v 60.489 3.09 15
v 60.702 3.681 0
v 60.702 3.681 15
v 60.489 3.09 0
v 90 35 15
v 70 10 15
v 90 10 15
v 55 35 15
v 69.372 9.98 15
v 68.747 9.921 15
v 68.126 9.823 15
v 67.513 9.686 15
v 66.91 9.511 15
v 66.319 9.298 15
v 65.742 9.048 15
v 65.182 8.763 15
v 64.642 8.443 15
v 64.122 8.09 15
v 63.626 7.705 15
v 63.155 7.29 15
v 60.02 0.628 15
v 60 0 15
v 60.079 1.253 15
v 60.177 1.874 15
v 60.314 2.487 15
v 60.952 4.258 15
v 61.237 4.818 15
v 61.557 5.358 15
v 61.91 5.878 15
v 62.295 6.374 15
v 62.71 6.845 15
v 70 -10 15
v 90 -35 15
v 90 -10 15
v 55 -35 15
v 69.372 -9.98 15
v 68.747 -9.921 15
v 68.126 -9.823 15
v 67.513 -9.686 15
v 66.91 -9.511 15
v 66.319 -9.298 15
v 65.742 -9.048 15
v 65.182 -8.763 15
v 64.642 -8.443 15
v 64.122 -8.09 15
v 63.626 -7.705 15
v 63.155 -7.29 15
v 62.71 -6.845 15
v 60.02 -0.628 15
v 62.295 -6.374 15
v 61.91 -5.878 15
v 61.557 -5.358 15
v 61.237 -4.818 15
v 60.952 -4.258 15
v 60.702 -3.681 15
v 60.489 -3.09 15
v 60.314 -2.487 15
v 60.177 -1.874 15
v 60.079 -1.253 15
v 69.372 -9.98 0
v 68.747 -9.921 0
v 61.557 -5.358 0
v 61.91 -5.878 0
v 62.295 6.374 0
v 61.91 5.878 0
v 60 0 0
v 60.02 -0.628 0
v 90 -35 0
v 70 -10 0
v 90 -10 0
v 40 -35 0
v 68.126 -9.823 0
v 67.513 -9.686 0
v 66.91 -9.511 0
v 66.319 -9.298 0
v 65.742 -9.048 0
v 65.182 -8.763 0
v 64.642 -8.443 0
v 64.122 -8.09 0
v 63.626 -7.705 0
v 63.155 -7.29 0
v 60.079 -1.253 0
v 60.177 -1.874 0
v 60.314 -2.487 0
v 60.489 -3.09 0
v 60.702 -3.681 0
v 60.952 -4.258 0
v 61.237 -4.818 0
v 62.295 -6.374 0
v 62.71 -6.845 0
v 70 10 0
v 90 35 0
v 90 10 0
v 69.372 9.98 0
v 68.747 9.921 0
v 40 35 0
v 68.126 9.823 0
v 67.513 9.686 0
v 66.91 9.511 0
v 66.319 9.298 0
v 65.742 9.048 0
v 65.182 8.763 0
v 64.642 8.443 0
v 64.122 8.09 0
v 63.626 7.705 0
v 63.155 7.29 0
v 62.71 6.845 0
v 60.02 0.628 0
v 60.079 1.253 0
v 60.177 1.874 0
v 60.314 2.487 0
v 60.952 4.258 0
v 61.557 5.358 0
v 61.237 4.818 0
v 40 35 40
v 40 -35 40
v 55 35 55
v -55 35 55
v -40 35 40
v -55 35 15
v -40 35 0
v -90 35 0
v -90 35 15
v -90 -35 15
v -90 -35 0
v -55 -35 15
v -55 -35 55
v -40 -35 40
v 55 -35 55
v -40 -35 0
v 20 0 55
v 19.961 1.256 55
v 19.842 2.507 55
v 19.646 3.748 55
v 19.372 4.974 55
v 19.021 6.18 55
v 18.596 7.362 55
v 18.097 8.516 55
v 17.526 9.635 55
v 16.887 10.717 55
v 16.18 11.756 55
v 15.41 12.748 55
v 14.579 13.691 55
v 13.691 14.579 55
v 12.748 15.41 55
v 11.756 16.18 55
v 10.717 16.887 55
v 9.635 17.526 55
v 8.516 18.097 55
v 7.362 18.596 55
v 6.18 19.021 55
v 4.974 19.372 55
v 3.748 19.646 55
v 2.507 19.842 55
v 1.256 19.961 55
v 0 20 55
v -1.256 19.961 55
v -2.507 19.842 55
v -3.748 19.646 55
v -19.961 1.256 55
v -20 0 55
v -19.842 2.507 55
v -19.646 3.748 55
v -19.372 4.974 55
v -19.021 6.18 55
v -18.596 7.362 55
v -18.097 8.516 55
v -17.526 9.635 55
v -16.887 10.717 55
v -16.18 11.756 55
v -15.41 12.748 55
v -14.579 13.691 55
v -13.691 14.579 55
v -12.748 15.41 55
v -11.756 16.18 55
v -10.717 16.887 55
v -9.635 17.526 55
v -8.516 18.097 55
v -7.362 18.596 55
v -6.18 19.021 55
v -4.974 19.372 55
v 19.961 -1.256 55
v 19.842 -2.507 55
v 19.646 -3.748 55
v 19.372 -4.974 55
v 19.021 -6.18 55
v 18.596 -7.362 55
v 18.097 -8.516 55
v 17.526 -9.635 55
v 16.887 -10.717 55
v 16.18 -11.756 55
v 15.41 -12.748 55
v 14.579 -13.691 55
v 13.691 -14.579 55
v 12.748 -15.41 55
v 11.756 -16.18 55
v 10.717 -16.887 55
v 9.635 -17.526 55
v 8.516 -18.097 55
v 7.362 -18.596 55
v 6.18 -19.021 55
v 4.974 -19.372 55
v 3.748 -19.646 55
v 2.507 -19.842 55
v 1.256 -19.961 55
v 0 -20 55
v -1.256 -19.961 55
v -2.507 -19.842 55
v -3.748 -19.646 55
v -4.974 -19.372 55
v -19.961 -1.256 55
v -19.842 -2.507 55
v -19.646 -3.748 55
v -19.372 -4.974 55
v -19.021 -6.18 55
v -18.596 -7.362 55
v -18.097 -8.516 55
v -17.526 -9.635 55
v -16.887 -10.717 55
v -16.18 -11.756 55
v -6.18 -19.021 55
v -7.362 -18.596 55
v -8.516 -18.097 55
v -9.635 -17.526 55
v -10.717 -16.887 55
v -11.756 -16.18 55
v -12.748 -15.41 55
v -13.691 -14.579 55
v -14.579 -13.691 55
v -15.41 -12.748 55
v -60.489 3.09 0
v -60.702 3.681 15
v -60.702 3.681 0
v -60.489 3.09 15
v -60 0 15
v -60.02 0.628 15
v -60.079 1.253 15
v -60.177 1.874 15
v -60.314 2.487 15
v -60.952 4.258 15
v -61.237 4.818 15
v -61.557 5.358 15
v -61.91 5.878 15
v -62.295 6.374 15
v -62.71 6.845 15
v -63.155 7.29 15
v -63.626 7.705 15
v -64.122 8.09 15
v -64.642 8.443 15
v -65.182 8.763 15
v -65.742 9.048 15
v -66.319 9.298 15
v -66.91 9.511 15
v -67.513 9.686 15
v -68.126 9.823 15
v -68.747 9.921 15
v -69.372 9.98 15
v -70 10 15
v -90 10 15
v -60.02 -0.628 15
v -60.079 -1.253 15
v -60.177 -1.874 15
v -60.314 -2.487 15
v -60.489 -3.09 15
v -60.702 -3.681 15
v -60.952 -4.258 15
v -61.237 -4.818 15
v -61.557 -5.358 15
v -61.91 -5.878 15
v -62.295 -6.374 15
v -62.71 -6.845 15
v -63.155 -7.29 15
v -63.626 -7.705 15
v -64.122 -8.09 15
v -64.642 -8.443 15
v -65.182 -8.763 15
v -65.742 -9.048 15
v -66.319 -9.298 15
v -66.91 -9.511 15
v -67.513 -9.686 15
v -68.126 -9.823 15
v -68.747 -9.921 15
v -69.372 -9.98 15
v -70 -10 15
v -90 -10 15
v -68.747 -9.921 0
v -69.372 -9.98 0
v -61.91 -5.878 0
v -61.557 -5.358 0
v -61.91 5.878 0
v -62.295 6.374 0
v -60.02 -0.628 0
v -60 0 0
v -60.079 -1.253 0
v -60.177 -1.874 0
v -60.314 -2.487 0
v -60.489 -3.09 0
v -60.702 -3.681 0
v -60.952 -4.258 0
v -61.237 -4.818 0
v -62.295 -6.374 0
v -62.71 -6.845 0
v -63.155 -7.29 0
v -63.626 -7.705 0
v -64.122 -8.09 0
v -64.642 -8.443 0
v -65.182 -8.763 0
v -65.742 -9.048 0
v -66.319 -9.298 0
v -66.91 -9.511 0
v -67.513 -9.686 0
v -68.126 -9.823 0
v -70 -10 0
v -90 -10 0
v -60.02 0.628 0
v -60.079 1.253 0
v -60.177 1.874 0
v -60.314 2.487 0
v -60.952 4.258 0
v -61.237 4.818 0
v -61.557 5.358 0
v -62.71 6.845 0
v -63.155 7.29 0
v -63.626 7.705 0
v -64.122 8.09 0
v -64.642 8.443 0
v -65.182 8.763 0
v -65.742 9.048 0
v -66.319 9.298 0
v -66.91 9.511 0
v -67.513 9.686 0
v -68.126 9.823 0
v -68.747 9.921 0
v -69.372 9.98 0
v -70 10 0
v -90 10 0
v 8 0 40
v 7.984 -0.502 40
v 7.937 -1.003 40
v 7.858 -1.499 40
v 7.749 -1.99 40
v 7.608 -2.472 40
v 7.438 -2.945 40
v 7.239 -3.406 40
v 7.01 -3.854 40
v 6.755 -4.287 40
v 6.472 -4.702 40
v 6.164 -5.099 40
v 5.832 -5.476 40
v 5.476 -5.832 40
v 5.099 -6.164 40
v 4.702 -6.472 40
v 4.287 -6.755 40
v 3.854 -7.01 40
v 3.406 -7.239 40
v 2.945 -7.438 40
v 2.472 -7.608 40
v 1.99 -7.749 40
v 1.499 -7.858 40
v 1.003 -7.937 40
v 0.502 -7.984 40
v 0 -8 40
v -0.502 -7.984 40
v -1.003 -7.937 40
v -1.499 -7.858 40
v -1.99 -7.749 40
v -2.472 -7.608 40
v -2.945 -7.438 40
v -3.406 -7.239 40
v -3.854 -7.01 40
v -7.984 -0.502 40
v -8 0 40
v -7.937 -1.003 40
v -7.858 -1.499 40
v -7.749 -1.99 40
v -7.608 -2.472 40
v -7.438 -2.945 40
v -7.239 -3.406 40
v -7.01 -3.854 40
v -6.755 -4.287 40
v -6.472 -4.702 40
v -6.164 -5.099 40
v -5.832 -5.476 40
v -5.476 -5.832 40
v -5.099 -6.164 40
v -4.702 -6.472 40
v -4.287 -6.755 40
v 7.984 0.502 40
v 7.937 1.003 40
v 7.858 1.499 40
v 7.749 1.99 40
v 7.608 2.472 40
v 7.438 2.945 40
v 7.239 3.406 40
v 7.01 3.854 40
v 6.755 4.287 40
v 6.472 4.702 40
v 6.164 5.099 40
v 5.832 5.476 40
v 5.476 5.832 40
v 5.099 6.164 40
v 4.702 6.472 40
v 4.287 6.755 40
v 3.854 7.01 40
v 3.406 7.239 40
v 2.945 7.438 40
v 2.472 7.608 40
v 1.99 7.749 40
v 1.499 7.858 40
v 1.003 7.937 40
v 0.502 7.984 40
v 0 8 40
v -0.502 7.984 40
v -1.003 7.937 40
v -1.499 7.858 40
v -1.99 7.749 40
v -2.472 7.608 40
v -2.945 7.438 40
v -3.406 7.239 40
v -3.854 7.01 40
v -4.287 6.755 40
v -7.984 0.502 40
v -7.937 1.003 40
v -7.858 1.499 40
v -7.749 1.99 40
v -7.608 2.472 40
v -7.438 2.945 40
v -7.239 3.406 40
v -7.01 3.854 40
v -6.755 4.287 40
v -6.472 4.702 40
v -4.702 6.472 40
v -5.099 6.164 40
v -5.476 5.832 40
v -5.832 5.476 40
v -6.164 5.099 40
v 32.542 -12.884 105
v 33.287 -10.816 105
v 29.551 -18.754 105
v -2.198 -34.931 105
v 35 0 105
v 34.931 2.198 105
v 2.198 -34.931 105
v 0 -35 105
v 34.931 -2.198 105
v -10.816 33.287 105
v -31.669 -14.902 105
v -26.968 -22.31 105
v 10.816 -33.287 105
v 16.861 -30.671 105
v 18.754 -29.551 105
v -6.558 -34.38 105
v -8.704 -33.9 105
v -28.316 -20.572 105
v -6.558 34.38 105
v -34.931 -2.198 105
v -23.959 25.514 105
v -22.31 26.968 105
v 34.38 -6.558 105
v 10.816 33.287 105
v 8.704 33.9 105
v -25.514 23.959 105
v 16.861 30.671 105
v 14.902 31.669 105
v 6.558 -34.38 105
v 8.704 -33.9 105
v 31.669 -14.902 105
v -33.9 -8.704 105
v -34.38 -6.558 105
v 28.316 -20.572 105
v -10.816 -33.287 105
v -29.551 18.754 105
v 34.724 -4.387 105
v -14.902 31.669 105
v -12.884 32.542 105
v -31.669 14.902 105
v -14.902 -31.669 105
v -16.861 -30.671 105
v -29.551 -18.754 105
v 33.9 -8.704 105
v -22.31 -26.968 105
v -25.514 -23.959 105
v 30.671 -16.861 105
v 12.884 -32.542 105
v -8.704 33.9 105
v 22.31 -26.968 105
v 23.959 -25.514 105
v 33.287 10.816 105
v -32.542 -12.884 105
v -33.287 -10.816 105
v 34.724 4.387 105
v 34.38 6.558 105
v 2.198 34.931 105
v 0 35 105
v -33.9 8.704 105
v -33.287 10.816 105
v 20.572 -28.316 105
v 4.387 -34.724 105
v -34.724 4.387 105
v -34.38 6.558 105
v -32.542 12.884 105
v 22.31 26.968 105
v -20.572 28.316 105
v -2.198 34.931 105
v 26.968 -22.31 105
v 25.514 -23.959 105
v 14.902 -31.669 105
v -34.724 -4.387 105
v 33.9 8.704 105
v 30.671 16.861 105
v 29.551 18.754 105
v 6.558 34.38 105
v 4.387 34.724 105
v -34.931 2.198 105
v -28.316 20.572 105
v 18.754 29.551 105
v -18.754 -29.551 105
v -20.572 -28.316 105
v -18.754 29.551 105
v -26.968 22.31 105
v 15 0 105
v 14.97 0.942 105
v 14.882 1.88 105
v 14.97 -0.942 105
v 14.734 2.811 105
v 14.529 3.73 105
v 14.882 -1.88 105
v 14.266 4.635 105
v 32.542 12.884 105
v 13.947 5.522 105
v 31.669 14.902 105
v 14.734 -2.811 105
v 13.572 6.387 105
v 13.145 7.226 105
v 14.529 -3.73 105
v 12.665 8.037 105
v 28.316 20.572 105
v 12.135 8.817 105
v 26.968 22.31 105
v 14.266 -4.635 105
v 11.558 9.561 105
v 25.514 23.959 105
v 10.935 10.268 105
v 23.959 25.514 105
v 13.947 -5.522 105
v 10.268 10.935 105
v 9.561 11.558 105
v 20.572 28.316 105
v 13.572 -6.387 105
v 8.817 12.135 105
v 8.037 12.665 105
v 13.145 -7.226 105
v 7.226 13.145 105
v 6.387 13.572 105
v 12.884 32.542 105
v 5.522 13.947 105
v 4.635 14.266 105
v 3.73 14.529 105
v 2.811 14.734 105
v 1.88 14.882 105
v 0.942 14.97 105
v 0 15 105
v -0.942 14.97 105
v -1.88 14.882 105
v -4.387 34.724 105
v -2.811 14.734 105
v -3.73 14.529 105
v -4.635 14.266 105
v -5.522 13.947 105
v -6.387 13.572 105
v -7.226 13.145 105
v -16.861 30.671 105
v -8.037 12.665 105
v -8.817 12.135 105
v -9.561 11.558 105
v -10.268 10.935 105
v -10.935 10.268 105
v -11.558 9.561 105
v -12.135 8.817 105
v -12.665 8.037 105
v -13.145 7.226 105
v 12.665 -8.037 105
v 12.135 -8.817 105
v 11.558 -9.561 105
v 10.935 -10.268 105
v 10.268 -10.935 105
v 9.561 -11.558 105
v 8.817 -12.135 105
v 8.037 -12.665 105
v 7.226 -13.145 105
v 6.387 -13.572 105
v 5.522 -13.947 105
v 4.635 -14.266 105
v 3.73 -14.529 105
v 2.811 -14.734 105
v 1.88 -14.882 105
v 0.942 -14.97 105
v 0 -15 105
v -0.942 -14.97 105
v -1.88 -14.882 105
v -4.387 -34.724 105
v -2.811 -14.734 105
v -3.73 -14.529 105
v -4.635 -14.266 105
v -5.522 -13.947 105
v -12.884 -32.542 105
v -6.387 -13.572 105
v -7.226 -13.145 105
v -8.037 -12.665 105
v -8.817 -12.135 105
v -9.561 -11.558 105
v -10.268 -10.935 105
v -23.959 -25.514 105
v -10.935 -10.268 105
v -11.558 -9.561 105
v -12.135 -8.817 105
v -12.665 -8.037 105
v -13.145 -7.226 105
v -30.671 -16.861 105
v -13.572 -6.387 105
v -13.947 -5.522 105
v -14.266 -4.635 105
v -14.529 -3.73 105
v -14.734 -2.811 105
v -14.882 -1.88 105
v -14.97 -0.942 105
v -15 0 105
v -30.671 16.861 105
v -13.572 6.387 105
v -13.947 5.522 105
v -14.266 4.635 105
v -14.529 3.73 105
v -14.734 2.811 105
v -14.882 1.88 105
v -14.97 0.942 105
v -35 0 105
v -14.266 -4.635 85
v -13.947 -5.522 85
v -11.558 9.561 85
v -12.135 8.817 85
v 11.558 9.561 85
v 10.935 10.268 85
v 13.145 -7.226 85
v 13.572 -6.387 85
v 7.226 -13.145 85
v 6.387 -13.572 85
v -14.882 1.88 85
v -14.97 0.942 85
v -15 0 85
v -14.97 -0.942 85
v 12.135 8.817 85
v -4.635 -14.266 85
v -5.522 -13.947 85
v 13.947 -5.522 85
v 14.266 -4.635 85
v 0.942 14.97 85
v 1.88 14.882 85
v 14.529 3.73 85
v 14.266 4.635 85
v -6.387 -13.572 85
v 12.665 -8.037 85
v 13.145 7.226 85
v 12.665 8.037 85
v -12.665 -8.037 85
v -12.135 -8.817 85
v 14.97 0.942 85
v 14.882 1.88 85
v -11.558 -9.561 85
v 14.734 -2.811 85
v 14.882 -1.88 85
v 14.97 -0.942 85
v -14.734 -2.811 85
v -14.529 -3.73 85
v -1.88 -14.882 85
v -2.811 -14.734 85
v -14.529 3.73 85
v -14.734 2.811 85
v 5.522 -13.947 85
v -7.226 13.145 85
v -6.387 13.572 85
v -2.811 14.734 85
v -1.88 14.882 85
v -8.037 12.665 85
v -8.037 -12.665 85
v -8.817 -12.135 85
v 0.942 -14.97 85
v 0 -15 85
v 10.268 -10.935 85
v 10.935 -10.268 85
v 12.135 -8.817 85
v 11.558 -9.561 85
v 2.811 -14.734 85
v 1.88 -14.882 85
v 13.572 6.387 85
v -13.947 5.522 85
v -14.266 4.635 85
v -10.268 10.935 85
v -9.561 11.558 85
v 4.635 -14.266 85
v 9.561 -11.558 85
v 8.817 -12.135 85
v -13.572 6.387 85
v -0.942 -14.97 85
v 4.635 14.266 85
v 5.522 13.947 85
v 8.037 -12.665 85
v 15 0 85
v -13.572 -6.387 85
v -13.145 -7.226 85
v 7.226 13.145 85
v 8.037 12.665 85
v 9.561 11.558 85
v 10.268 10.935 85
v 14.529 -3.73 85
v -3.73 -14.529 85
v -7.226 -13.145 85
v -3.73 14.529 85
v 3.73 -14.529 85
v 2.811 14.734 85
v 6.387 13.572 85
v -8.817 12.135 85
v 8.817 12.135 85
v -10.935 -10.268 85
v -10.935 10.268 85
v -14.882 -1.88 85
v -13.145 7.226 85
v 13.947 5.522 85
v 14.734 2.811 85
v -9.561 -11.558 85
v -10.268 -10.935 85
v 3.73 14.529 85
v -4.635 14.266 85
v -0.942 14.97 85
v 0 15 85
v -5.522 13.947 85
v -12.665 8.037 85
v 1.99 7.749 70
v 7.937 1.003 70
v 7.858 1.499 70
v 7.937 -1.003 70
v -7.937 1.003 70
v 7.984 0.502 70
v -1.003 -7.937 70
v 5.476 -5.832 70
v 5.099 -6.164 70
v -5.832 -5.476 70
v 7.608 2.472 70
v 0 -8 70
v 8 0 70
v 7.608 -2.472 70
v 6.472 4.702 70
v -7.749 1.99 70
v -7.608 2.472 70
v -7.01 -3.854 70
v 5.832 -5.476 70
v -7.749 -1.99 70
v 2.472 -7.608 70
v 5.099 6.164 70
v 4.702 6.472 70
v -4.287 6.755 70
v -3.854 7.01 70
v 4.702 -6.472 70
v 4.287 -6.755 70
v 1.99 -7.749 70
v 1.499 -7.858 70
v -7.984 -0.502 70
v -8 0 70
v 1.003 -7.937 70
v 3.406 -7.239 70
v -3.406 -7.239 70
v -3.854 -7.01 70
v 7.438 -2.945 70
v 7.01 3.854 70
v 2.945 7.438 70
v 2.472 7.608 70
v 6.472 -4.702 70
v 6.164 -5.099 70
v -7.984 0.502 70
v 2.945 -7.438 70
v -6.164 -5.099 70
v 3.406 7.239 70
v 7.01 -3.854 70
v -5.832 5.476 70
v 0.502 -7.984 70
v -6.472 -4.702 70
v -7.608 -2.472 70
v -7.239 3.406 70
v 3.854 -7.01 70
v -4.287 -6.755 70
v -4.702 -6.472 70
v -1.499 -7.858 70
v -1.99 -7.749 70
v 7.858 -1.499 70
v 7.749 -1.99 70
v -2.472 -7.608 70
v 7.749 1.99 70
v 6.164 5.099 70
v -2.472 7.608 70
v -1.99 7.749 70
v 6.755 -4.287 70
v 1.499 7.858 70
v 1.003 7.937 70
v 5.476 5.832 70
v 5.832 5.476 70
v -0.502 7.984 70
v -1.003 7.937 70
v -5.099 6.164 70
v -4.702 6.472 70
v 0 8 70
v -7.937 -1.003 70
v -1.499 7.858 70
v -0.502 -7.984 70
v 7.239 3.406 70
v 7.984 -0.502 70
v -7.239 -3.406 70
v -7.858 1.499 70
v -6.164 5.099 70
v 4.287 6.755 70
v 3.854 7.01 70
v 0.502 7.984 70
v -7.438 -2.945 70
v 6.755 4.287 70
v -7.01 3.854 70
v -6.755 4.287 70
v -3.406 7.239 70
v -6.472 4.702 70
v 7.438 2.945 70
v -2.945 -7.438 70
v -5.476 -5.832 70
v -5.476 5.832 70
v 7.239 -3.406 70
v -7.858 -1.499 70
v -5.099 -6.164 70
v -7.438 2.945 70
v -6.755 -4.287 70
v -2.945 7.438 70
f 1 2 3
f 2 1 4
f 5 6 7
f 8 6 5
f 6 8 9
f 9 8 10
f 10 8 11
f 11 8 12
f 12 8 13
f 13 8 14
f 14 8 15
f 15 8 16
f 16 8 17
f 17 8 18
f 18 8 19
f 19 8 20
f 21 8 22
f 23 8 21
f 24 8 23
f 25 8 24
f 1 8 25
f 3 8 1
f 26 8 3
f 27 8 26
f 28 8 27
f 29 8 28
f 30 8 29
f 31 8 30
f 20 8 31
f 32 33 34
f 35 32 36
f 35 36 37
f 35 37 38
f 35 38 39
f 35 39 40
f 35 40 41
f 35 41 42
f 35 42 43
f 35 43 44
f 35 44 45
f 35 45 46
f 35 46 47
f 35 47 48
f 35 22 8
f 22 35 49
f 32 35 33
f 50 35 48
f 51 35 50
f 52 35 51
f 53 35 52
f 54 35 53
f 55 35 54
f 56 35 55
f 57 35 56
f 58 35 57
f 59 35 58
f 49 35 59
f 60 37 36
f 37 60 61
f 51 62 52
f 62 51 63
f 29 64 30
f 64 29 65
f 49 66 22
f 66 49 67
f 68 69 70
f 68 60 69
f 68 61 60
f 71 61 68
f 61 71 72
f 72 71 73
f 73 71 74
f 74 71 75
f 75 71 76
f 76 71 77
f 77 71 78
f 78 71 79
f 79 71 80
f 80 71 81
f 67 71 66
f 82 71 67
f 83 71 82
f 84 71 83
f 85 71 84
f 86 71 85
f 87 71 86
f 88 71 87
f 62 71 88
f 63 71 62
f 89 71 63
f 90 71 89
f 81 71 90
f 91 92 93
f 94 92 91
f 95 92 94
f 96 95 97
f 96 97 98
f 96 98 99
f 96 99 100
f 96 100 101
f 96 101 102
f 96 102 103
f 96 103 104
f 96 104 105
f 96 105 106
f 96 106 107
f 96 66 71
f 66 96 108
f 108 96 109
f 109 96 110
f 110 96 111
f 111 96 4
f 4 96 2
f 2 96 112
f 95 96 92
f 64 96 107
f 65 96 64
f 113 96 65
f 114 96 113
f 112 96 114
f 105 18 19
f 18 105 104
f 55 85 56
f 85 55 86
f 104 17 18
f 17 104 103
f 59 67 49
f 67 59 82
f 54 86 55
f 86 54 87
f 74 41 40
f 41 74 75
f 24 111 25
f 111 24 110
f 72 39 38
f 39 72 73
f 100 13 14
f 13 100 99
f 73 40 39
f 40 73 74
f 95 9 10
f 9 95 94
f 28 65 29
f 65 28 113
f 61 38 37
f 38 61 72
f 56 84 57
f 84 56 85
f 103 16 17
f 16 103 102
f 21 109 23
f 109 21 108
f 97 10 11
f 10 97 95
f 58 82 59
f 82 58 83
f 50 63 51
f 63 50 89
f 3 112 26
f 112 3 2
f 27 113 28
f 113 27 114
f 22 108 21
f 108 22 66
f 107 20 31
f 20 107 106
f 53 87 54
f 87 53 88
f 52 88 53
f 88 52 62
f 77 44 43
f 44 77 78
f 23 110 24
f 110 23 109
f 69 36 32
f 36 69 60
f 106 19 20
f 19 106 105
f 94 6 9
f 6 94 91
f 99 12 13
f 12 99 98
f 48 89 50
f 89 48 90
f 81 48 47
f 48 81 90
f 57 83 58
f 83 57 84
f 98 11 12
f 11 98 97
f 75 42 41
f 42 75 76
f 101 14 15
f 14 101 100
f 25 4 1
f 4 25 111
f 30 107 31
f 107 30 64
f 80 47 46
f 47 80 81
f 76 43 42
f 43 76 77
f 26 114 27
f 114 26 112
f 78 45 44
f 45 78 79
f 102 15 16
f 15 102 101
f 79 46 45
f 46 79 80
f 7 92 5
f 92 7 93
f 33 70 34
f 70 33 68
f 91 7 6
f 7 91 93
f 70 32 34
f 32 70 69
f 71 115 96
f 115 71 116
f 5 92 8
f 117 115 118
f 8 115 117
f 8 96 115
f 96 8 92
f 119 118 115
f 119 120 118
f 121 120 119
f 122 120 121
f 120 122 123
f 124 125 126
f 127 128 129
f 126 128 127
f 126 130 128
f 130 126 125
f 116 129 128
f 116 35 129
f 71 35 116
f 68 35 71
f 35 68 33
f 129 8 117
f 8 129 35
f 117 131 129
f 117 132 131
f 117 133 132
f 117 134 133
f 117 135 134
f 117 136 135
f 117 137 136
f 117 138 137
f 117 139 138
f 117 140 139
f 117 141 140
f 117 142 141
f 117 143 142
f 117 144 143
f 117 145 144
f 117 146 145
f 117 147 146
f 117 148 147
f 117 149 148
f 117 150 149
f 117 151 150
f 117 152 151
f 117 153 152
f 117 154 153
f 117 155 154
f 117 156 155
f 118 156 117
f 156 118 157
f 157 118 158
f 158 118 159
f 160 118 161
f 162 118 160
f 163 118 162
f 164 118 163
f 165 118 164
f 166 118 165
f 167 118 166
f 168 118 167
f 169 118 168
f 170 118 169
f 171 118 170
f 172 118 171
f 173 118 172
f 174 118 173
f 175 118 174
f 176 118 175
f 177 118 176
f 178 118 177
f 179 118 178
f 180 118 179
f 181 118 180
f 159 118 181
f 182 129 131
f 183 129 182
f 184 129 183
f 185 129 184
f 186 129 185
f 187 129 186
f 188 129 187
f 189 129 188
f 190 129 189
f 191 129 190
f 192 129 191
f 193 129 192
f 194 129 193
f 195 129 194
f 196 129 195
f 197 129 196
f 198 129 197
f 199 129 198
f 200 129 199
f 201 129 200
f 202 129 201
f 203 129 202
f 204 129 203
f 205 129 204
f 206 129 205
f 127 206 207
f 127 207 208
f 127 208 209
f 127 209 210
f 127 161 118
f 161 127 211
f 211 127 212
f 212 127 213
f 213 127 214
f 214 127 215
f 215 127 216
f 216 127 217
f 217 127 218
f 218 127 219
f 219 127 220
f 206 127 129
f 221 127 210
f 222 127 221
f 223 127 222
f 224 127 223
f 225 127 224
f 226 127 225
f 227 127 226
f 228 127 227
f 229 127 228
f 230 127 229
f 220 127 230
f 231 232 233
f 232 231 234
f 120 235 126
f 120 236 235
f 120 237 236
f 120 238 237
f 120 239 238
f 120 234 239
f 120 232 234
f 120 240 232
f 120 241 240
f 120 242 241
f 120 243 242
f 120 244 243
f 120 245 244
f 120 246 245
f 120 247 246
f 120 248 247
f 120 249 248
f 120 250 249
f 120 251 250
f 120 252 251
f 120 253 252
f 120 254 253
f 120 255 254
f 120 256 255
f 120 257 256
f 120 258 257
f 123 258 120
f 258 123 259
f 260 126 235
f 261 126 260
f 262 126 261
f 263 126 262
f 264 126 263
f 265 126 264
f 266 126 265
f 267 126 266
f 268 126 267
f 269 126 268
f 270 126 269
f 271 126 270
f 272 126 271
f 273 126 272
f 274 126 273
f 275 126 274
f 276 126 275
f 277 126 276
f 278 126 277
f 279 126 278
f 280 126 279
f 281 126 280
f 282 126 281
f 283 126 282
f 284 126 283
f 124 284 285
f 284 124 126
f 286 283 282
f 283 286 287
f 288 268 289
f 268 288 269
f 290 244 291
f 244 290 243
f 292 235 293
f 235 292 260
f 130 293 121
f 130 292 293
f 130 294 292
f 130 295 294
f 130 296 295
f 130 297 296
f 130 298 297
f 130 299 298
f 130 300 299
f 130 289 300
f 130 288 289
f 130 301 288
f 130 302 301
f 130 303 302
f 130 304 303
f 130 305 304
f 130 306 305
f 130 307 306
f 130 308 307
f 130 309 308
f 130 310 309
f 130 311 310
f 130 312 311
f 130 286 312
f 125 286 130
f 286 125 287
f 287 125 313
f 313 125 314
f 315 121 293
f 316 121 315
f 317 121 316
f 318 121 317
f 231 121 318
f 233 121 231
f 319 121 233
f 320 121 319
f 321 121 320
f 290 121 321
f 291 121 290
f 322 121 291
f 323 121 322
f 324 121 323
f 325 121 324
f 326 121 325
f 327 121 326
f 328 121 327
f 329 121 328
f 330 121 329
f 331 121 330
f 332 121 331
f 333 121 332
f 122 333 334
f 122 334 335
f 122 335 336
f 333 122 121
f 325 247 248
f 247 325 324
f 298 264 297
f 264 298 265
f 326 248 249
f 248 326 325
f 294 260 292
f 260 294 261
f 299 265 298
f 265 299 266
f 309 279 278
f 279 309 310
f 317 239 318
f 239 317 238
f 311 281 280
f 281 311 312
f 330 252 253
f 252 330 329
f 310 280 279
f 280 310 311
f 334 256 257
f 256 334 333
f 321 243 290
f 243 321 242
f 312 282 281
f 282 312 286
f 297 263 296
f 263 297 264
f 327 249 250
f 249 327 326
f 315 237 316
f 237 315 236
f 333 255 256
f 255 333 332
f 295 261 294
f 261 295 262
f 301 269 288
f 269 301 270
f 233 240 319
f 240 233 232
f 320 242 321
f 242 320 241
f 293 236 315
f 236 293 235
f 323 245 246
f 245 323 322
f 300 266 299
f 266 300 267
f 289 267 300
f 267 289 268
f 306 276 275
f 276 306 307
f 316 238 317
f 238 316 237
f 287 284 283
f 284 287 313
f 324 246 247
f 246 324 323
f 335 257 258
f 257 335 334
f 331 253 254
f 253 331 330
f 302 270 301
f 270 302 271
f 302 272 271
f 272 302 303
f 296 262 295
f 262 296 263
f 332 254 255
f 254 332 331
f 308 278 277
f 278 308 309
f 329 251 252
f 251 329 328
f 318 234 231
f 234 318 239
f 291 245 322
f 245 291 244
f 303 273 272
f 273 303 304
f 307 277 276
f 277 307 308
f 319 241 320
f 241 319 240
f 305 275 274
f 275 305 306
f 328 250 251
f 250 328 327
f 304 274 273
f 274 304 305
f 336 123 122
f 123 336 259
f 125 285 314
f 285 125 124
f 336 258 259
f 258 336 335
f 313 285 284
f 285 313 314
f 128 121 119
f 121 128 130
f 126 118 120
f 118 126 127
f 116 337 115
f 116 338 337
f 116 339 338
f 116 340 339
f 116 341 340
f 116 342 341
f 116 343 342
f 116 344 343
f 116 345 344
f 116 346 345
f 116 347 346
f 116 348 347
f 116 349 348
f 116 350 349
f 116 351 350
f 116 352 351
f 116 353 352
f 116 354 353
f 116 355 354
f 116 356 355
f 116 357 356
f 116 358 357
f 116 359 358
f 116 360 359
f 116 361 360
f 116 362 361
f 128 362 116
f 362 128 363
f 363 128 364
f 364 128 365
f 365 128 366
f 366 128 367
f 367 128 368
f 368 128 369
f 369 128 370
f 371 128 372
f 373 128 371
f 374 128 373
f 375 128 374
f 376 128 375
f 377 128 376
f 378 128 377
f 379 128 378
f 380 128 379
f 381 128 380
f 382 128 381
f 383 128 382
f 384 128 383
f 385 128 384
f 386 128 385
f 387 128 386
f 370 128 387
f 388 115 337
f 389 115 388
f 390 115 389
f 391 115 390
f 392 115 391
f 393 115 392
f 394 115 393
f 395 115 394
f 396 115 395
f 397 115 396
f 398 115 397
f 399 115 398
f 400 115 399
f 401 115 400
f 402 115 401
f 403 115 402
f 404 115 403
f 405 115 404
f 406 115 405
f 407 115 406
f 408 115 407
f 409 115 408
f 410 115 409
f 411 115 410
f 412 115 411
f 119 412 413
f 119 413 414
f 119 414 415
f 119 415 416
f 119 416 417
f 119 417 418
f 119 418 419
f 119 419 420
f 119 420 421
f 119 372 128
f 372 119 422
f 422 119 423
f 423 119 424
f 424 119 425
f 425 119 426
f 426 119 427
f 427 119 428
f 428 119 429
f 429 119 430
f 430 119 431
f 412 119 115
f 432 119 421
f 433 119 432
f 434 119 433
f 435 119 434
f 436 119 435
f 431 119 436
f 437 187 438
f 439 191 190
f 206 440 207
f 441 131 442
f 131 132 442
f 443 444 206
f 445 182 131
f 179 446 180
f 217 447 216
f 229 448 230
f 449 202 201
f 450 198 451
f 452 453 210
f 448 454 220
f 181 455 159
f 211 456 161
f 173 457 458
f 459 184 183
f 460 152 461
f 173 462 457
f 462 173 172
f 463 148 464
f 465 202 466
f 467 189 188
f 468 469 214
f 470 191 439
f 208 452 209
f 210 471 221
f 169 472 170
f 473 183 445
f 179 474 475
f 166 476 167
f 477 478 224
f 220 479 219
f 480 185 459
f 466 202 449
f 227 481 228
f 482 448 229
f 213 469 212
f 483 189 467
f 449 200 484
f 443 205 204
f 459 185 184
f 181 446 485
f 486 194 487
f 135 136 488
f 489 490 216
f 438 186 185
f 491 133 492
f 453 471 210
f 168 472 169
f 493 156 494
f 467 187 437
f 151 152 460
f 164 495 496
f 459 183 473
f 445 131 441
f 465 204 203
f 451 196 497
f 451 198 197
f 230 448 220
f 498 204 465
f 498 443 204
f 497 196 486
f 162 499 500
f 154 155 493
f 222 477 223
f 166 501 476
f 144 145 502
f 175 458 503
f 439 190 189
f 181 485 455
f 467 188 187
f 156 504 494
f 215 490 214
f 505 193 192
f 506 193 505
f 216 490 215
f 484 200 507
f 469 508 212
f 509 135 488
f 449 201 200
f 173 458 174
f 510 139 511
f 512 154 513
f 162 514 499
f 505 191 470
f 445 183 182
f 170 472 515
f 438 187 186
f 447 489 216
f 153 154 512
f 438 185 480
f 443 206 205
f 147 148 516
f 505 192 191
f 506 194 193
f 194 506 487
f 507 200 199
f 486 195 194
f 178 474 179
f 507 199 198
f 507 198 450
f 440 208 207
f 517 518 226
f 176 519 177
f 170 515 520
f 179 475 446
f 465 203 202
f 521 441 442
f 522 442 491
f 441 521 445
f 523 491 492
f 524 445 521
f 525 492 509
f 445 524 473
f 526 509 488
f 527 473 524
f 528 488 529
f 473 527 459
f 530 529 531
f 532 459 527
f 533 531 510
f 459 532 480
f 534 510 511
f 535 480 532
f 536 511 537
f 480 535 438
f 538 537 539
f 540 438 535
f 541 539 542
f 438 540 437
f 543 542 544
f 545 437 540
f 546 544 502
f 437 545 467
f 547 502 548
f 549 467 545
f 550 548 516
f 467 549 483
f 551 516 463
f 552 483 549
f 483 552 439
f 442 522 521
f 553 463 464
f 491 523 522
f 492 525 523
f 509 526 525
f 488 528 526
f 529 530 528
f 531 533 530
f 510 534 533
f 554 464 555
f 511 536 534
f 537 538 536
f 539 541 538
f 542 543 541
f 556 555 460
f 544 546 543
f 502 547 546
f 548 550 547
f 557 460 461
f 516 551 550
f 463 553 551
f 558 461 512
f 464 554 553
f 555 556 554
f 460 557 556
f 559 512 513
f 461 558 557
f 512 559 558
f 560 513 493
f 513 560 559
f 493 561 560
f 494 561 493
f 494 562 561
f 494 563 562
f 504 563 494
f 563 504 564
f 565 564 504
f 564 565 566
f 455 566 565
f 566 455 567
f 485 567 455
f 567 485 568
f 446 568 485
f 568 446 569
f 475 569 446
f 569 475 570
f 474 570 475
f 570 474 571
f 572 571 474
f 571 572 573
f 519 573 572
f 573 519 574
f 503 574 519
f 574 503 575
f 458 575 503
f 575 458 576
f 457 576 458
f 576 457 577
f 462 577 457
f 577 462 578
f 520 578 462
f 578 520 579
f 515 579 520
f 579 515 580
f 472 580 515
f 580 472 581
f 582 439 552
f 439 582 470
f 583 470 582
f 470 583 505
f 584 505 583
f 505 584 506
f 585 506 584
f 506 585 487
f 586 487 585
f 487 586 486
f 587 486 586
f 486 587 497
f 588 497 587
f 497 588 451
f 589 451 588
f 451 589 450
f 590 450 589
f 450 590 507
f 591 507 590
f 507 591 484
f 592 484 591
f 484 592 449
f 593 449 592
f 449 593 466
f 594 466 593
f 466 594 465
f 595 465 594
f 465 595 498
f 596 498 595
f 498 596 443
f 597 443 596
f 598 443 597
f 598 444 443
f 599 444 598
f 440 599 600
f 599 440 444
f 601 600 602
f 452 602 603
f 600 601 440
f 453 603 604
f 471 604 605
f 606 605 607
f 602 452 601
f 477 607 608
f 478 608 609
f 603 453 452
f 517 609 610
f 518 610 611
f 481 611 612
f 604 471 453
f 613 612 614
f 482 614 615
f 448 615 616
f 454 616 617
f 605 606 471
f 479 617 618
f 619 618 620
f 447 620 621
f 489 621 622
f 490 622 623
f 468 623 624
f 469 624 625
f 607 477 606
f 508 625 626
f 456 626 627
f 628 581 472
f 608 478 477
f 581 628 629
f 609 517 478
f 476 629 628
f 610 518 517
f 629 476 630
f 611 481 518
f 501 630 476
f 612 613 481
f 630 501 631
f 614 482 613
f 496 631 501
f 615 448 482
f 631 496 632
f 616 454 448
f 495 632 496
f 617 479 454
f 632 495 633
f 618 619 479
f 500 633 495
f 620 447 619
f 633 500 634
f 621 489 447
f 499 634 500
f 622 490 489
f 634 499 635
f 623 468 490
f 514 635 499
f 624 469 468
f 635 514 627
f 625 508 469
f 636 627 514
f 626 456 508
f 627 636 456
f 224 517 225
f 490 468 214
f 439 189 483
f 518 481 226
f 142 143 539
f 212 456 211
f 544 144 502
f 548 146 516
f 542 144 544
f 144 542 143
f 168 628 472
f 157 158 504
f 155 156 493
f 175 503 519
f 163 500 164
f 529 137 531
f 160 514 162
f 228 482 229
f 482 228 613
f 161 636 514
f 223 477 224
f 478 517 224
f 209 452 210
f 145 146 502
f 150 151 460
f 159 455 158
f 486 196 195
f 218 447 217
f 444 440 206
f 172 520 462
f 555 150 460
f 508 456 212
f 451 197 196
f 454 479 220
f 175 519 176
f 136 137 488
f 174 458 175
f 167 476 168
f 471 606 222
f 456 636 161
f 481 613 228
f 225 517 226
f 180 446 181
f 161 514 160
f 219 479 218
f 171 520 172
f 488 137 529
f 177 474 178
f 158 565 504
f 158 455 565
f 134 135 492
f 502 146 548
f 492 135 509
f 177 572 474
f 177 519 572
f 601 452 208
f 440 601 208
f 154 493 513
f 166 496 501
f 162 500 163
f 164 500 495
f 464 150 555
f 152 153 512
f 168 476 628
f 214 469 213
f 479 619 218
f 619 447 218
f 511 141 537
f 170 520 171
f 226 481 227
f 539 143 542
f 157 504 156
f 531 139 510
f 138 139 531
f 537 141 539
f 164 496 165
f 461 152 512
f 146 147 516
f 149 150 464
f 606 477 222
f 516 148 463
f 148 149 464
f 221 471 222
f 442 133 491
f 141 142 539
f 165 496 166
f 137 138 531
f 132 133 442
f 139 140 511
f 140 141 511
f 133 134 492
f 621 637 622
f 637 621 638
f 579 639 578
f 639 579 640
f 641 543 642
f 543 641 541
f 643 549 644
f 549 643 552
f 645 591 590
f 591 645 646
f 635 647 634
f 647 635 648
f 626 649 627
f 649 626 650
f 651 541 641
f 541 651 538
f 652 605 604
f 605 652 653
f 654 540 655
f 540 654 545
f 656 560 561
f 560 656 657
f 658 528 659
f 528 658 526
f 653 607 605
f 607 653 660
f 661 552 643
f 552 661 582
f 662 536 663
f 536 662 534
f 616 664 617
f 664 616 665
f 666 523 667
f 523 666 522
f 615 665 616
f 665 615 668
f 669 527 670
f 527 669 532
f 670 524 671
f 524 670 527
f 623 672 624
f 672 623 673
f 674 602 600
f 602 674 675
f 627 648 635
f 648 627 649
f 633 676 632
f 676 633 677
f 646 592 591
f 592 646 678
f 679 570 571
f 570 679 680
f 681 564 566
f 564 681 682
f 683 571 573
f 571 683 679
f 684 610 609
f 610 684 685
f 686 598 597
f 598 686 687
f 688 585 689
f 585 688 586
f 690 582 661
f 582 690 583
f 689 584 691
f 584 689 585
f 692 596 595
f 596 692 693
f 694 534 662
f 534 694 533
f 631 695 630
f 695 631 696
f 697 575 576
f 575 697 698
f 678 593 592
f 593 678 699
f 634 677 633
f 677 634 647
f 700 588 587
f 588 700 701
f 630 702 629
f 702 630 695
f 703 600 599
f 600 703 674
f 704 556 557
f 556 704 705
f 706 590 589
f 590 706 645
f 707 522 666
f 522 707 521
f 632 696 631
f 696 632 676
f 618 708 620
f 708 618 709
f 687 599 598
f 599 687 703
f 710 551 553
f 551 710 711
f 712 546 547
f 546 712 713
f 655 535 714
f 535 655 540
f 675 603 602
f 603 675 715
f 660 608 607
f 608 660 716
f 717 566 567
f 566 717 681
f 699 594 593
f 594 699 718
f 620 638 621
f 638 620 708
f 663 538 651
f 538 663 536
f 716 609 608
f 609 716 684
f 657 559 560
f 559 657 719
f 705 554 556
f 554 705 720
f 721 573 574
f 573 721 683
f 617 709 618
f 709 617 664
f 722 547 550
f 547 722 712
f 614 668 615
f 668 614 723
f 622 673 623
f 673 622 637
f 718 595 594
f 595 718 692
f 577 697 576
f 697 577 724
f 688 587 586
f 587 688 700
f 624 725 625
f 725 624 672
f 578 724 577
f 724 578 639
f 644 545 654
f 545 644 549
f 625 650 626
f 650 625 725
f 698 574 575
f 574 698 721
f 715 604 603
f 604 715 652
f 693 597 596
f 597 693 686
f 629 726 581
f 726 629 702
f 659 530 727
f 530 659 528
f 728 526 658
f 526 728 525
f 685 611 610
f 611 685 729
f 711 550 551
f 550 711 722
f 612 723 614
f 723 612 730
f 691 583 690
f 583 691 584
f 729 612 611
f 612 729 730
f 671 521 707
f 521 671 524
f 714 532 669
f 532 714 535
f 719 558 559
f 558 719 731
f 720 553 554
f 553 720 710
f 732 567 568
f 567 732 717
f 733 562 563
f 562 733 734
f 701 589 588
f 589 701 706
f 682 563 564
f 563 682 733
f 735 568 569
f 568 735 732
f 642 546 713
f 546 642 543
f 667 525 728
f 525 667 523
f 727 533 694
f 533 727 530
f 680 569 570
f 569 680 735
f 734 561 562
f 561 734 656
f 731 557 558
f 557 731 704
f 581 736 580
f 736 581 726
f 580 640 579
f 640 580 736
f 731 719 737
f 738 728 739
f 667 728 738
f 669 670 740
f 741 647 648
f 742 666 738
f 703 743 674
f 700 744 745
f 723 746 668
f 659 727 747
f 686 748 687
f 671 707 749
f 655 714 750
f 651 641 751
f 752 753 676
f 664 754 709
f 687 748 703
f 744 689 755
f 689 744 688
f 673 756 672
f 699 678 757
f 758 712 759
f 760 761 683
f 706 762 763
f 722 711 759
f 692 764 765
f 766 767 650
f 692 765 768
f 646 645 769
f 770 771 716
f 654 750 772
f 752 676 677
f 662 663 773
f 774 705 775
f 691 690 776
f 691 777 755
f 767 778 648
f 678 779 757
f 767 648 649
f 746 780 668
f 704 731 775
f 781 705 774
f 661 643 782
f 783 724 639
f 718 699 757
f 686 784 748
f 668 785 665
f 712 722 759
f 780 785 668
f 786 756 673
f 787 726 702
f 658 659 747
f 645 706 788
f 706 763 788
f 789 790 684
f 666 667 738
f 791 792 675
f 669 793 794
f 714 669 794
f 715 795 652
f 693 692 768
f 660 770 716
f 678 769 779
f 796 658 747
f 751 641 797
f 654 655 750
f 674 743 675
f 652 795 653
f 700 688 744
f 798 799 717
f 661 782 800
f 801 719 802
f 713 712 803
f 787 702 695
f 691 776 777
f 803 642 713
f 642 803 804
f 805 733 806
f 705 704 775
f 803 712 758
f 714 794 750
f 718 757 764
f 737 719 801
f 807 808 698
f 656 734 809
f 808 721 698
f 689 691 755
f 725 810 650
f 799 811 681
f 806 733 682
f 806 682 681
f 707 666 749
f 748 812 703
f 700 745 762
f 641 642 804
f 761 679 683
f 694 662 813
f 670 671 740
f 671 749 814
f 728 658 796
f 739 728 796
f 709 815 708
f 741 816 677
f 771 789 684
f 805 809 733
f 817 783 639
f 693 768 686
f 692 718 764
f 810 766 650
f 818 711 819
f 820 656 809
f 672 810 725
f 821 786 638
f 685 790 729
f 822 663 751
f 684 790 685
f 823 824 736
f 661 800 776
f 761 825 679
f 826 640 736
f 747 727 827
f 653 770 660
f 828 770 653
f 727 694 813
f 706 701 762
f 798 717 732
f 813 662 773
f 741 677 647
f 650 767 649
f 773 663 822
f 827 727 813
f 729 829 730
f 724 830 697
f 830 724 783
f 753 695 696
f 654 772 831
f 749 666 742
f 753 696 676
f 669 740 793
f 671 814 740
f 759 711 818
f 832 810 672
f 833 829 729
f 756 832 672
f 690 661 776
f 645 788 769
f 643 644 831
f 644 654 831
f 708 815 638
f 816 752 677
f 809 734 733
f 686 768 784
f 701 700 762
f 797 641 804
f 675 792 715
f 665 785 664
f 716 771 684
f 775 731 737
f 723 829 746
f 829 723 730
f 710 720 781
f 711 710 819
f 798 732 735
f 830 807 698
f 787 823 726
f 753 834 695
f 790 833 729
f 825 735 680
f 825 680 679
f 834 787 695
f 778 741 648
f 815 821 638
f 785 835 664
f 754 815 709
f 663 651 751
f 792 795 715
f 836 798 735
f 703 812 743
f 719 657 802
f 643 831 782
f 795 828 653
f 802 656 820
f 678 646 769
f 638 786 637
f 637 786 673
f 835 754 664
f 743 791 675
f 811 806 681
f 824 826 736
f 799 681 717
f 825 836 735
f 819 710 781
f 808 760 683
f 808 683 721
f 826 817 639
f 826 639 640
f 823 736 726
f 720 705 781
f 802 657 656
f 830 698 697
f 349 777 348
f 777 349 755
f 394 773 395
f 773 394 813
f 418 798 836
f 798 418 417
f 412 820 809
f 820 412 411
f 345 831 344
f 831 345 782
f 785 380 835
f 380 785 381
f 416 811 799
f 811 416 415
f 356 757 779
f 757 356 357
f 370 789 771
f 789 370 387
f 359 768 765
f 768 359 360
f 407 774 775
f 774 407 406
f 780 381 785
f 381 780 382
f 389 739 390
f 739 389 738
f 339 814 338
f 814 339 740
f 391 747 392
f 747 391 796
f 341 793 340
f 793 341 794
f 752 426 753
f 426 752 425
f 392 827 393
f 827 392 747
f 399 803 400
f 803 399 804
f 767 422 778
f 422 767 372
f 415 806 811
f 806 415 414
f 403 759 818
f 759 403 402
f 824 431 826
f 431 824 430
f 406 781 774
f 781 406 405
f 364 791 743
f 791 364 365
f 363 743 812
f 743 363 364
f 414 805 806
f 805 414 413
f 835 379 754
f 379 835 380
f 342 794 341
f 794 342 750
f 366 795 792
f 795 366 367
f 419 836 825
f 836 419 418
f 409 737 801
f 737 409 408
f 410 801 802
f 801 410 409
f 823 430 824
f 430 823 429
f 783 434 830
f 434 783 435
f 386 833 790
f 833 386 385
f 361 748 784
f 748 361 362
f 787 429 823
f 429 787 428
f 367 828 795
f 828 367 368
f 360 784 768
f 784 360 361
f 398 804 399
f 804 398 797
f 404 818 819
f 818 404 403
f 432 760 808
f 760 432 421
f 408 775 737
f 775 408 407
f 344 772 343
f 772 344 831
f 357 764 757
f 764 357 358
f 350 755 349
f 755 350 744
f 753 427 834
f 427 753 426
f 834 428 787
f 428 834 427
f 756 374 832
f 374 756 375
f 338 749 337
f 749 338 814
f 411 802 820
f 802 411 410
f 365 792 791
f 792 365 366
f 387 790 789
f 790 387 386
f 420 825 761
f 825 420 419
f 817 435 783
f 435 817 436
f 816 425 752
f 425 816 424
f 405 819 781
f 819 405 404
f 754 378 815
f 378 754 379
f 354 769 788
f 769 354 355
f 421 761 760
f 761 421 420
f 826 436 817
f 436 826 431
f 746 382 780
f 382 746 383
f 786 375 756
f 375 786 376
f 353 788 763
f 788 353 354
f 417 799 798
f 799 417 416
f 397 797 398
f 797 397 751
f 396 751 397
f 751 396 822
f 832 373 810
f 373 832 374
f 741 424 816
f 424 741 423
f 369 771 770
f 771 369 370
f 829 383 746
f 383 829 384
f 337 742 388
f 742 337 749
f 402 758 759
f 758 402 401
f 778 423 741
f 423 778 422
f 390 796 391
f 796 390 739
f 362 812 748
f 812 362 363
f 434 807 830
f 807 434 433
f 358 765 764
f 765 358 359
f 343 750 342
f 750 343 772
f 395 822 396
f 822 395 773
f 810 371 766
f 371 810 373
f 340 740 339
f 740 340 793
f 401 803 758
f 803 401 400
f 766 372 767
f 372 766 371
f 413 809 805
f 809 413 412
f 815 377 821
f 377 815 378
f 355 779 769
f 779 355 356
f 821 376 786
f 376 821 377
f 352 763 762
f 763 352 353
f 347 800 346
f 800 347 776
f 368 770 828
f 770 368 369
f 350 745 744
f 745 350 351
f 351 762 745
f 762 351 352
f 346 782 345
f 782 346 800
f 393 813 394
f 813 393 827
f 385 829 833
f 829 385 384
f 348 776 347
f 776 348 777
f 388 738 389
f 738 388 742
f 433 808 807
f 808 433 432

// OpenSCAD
$fn=100;
mm=1; // define units
degrees=1;

include <lib.scad>

module example_118(){
     base_height=55*mm;
     plate_thickness=15*mm;
     module bracket(){
	  thickness=plate_thickness;
	  width=70*mm;
	  height=base_height;
	  length=180*mm;
	  top_lenght=80*mm;
	  afixment_lengh=(length-top_lenght)/2;
	  module plate(){
	       translate(up(base_height)){
		    Cube([top_lenght,width,-thickness],center=X+Y);}}
	  module wall(){
	       Cube([thickness,width,height],center=Y);}
	  module afixment(){
	       hole_radius=10*mm;
	       slot_height=20*mm;
	       difference(){
		    Cube([afixment_lengh,width,thickness],center=Y);
		    translate(forward(afixment_lengh-slot_height)){
			 arch(r=hole_radius,
			      h=slot_height+hole_radius,
			      t=thickness);}}}
	  plate();
	  pair(top_lenght){
	       wall();
	       afixment();}}
     module nozzel(){
	  cylinder(r1=20*mm,r2=35*mm,h=50*mm);}
     module nozzel_hole(){
	  camshaft([         8*mm,
		    30*mm*Z, 8*mm,
		    15*mm*Z,15*mm,
		    20*mm*Z,15*mm]);}
     difference(){
	  union(){
	       bracket();
	       translate(up(base_height)){
		    nozzel();}}
	  translate(up(base_height-plate_thickness)){
	       nozzel_hole();}}}

example_118();
